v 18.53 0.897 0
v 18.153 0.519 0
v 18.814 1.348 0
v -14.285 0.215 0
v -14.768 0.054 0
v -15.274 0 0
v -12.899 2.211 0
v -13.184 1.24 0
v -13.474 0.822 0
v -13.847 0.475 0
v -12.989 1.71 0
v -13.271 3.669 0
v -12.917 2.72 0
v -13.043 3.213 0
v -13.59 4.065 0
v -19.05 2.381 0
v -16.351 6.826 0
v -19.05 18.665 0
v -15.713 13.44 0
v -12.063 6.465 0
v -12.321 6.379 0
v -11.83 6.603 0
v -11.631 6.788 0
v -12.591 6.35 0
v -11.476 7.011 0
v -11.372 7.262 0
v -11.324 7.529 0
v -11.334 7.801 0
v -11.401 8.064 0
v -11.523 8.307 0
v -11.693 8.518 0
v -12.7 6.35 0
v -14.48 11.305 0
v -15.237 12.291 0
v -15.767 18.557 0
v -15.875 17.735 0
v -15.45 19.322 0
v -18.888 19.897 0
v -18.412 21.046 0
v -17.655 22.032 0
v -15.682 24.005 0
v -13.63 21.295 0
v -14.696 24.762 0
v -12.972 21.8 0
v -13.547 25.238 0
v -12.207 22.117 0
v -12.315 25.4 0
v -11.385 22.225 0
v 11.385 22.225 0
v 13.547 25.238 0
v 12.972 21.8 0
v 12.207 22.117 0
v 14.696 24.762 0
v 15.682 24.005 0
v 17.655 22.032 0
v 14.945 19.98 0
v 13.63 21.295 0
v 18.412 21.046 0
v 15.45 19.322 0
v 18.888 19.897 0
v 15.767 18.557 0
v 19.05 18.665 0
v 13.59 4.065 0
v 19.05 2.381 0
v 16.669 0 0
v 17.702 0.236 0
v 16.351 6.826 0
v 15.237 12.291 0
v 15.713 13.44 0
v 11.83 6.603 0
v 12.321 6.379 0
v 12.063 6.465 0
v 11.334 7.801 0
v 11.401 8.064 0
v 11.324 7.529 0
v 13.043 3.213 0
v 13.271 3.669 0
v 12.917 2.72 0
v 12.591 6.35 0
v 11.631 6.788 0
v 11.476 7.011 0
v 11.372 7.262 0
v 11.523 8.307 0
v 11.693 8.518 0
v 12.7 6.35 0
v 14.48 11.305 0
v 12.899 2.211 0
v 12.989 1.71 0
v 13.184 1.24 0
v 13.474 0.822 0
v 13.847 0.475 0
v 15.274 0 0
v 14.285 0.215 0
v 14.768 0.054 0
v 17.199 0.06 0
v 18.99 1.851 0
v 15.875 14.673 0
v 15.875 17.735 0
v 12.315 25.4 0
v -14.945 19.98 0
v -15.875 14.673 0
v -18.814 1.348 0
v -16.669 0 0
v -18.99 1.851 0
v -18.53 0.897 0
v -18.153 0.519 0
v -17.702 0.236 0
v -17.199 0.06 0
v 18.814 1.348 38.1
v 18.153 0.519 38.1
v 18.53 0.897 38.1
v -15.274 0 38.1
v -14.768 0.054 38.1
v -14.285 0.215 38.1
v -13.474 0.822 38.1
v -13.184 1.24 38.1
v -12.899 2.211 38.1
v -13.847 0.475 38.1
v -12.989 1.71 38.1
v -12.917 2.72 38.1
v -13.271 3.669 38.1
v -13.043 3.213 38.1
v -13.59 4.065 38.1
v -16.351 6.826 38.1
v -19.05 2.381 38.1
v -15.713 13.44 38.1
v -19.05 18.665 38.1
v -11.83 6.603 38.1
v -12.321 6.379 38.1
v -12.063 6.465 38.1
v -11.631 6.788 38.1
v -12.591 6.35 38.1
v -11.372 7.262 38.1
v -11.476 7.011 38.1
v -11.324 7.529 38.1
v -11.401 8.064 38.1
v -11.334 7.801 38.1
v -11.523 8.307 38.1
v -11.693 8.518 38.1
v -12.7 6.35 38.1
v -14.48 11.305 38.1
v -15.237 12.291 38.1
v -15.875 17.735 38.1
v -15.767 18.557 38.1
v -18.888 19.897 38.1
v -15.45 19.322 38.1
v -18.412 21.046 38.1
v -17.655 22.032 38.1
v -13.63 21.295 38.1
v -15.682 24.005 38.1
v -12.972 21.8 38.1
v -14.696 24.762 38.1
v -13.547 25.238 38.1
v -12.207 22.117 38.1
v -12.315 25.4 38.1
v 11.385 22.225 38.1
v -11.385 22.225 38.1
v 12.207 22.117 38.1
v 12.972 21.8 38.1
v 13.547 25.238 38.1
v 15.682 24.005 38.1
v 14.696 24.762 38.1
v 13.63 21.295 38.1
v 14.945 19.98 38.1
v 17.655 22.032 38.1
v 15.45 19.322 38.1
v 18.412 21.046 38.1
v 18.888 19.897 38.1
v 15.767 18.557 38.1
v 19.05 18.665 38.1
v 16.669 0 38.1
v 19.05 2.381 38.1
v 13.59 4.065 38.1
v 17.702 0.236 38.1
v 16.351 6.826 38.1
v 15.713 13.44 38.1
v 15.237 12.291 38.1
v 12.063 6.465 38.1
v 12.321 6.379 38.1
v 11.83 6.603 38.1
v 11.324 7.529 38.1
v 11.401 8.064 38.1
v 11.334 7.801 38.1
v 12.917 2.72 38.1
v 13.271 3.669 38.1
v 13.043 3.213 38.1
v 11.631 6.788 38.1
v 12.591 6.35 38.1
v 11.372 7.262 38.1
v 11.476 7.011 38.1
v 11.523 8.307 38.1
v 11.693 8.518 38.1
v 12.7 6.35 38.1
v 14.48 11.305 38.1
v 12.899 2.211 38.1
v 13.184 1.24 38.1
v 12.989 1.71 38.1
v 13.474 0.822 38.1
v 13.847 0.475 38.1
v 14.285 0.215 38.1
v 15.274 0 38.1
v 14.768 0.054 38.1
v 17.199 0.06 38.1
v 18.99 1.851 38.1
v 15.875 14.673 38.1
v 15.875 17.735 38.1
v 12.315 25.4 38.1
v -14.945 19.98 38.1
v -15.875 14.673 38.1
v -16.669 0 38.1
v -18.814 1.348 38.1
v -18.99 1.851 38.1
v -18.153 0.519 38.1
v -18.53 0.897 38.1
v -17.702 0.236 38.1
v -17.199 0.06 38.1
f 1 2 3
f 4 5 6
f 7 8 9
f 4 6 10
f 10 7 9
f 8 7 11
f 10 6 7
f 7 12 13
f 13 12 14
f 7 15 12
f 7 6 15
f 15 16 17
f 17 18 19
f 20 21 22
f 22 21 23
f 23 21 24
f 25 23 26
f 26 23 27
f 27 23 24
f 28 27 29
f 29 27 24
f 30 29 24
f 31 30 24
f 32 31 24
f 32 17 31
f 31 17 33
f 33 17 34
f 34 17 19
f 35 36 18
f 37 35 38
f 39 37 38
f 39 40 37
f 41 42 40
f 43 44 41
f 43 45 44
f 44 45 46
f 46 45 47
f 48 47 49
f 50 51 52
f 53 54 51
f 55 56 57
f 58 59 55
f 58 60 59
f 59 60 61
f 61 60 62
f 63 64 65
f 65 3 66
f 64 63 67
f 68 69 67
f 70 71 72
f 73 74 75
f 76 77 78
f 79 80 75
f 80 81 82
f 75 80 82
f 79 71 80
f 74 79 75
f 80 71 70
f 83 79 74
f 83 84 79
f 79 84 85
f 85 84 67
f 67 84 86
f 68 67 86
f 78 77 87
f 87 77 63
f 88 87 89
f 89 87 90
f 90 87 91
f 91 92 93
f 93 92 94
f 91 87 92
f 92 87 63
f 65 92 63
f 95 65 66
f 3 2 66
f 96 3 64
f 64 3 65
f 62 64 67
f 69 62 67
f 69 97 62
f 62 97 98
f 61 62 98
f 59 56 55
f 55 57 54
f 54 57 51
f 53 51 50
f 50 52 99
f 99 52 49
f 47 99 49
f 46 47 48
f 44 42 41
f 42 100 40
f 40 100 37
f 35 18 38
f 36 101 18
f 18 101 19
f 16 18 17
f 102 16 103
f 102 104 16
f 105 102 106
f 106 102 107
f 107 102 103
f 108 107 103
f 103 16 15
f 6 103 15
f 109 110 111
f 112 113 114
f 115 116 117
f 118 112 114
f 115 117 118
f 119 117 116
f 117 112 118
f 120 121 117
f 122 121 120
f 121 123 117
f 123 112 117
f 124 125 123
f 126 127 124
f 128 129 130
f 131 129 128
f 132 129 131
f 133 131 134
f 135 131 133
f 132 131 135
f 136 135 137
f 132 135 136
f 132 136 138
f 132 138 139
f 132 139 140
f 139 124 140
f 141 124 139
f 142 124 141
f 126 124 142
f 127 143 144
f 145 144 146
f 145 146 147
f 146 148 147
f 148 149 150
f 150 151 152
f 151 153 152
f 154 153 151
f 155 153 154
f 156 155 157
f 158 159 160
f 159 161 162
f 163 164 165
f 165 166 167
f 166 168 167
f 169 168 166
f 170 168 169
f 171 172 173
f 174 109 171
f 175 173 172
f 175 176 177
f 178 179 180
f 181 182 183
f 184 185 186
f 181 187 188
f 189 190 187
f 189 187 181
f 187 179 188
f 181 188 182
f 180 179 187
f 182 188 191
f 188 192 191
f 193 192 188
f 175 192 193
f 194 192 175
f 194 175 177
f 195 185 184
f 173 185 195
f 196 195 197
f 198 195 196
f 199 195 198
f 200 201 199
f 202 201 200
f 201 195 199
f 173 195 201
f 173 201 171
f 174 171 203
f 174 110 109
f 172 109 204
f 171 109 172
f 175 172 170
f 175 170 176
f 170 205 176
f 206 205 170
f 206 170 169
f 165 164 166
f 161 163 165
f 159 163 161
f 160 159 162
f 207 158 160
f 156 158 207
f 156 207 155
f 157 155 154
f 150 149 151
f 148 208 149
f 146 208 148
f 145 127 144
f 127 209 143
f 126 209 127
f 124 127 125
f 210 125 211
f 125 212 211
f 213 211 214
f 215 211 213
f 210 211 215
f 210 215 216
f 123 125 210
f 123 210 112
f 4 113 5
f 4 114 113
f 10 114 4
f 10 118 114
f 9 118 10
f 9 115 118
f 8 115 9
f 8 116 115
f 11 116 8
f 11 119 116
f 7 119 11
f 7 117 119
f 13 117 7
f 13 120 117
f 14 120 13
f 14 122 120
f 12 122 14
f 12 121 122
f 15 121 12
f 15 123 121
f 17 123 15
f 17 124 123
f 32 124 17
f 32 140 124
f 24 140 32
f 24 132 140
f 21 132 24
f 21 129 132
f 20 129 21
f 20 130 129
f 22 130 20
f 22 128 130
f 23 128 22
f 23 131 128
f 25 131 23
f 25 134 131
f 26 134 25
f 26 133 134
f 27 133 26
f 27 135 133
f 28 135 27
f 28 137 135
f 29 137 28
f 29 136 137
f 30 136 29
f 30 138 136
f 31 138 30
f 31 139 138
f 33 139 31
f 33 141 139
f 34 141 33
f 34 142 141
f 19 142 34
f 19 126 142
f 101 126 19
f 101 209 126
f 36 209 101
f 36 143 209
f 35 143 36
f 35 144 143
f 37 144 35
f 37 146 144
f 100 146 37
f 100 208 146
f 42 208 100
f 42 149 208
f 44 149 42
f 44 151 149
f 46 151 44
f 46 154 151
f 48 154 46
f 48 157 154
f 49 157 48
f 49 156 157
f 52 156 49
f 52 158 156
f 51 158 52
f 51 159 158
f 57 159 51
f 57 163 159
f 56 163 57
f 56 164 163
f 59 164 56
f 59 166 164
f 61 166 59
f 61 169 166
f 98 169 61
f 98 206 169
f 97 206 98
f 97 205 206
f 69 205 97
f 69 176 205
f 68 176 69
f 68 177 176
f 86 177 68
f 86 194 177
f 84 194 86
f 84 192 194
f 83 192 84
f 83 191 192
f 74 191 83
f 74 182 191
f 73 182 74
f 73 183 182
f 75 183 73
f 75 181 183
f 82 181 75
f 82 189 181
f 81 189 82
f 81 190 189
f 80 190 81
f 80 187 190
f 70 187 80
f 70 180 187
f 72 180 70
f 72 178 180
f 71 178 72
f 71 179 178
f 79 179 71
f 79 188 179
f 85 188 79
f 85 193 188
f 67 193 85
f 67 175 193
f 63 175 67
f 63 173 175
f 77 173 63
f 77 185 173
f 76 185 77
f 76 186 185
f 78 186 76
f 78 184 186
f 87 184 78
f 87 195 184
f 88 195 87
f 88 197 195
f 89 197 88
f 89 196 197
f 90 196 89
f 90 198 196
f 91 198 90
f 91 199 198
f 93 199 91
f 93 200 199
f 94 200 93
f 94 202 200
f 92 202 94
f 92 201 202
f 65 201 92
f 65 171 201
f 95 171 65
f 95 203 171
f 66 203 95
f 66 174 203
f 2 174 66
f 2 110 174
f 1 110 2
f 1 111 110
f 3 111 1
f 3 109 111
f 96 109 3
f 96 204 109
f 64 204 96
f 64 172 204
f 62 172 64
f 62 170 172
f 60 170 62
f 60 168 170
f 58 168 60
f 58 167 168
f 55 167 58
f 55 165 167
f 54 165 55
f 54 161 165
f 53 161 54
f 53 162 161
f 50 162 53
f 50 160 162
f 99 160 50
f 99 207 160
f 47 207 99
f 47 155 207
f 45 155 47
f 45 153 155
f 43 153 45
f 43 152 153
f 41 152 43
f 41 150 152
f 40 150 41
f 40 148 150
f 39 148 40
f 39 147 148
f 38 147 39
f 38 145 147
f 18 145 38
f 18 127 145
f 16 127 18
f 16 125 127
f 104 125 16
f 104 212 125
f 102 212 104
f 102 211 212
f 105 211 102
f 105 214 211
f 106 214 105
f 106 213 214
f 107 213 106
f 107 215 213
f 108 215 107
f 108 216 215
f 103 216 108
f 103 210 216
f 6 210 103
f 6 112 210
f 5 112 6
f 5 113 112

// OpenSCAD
// file: ../lib/TOGComplexLib1.scad
function tcplx1_multiply(a, b) =
	[a[0]*b[0] - a[1]*b[1], a[0]*b[1] + a[1]*b[0]];
function tcplx1_divide(a, b) =
	let(bot = (b[0]*b[0] + b[1]*b[1]))
	[
		(a[0]*b[0] + a[1]*b[1])/bot,
		(a[1]*b[0] - a[0]*b[1])/bot
	];

assert([-11,23] == tcplx1_multiply([3,2], [1,7]));

assert([-1,3] == tcplx1_multiply([3,1], [0,1]));
assert([-1,3] == tcplx1_multiply([0,1], [3,1]));

echo(tcplx1_divide([-1,3], [3,1]));
assert([0,1] == tcplx1_divide([-1,3], [3,1]));

function tcplx1_normalize(vec) =
	let(veclen = sqrt(vec[0]*vec[0]+vec[1]*vec[1]))
	[vec[0] / veclen, vec[1] / veclen];

function tcplx1_relative_turnvec_vv(v0, v1) =
	tcplx1_divide(tcplx1_normalize(v1), tcplx1_normalize(v0));

function tcplx1_relative_turnvec_abc(p0, p1, p2) = tcplx1_relative_turnvec_vv(p1-p0, p2-p1);

// A 90-degree turn
assert([0,1] == tcplx1_relative_turnvec_abc([0,0], [1,0], [1,1]));
assert([0,1] == tcplx1_relative_turnvec_abc([0,0], [0,1], [-1,1]));

// A 45-degree turn
assert(tcplx1_normalize([1,1]) == tcplx1_relative_turnvec_abc([0,0], [1,0], [ 2,1]));
assert(tcplx1_normalize([1,1]) == tcplx1_relative_turnvec_abc([0,0], [0,1], [-1,2]));


function tcplx1_relative_angle_abc(p0, p1, p2) =
	let(turnvec = tcplx1_relative_turnvec_abc(p0, p1, p2))
	atan2(turnvec[1], turnvec[0]);

assert(-135 == tcplx1_relative_angle_abc([0,0], [1,0], [0,-1]));
assert( -90 == tcplx1_relative_angle_abc([0,0], [1,0], [1,-1]));
assert(   0 == tcplx1_relative_angle_abc([0,0], [1,0], [2, 0]));
assert(  90 == tcplx1_relative_angle_abc([0,0], [1,0], [1, 1]));
assert( 135 == tcplx1_relative_angle_abc([0,0], [1,0], [0, 1]));

assert(  90 == tcplx1_relative_angle_abc([1,1], [3,3], [1, 5]));
// file: ../lib/TOGArrayLib1.scad
// TOGArrayLib1.5
// 
// Functions for working with arrays.
// 
// v1.1:
// - tal1_reduce assert(is_list(items)) to prevent infinite recursion
//   when given undefined or other non-list values
// v1.1.1:
// - Fix tal1_uniq_remap_v2 to return "list-remap-result" as the
//   first element of the returned list
// v1.2:
// - Add tal1_replace_at function
// v1.3:
// - tal1_is_vec_of, tal1_is_vec_of_num
// v1.4:
// - tal1_assert_for_each, for when you want to assert something
//   about each of a list of items and get nice failure messages
// v1.5:
// - Add tal1_duplicate_reversed function, which may be
//   handy when generating symmetrical polygons and stuff.

/**
 * Make a list with the contents of list `a`,
 * but starting at offset `off`, replaced by the contents of list `b`.
 * len(result) = max(len(a), off+len(b))
 */
function tal1_replace_at(a, off, b, default_value=undef, default_value_function=undef) =
	assert(is_list(a))
	assert(is_list(b))
	let( _dvf = !is_undef(default_value_function) ? default_value_function : function(i) default_value )
[
	for( i=[0:1:min(off,len(a))-1] ) a[i],
	for( i=[len(a):1:off-1] ) _dvf(i),
	for( i=[off:1:off+len(b)-1] ) b[i-off],
	for( i=[off+len(b):1:len(a)-1] ) a[i],
];

// Simplest case
assert([] == tal1_replace_at([], 0, []));
// Second simplest cases
assert(["foo"] == tal1_replace_at(["foo"], 0, []));
assert(["foo"] == tal1_replace_at([], 0, ["foo"]));
// Replace one item
assert(["foo","quux","baz"] == tal1_replace_at(["foo","bar","baz"], 1, ["quux"]));
// Replace and extend
assert(["foo","quux","tuna","tina"] == tal1_replace_at(["foo","bar","baz"], 1, ["quux", "tuna", "tina"]));
// Add beyond end of `a`
assert(["foo","zzz","quux"] == tal1_replace_at(["foo"], 2, ["quux"], default_value="zzz"));
// Adding 'nothing' should still fill to that point with defaults
assert(["foo","zzz","zzz"] == tal1_replace_at(["foo"], 3, [], default_value="zzz"));


function tal1_reduce(start, items, func, offset=0) =
	assert(is_list(items))
	len(items) == offset ? start :
	tal1_reduce(func(start, items[offset]), items, func, offset+1);

function tal1_consecutive_duplicate_count(items) = tal1_reduce(
	[0, undef],
	items,
	function(z,item) [z[0] + (item == z[1] ? 1 : 0), item]
)[0];

assert(0 == tal1_consecutive_duplicate_count([]));
assert(0 == tal1_consecutive_duplicate_count([50]));
assert(1 == tal1_consecutive_duplicate_count([50,50]));
assert(0 == tal1_consecutive_duplicate_count([50,51,52,53]));
assert(1 == tal1_consecutive_duplicate_count([50,51,52,52]));
assert(3 == tal1_consecutive_duplicate_count([50,50,50,50]));

// Set test_size to arbirarily large values
// to ensure that OpenSCAD can handle heavy recursion
let(test_size=1000) assert(test_size/2 == tal1_consecutive_duplicate_count([for(i=[0:1:test_size-1]) floor(i/2)]));



function tal1_uniq_(items, off0, off1) =
	let(chunklen = off1-off0)
	chunklen == 0 ? [] :
	chunklen == 1 ? [items[off0]] :
	let(half=floor(chunklen/2))
	let(left  = tal1_uniq_(items, off0     , off0+half))
	let(right = tal1_uniq_(items, off0+half, off1     ))
	assert(len(left) > 0)
	assert(len(right) > 0)
	left[len(left)-1] == right[0] ? [each left, for(i=[1:1:len(right)-1]) right[i]] :
	[each left, each right];

/** Given a list of items, returns a new list with identical consecutive items merged */
function tal1_uniq(items) = tal1_uniq_(items, 0, len(items));

assert([] == tal1_uniq([]));
assert([123] == tal1_uniq([123]));
assert([55,0,1,2,3] == tal1_uniq([55,0,1,2,3]));
assert([55,0,1,2] == tal1_uniq([55,0,1,1,2]));
assert([55,0,1] == tal1_uniq([55,55,0,0,0,0,0,0,1,1,1,1]));
assert([55,0] == tal1_uniq([55,0,0,0,0,0,0,0]));



/**
 * Returns [new items, old index -> new index mapping].
 * No-op version.
 */
function tal1_uniq_remap_v1(items) =
	["list-remap-result", items, [for (vi=[0:1:len(items)-1]) vi]];

// [a, a, b, b, c, c]
//
// [a,    ...], []  -> [a],[0]
// [a, a, ...], [0] -> [a],[0,0]

assert([1,2,3] == [1,2,3]);

/**
 * Recursive version that will combine adjacent identical vertexes,
 * but will use the original items.
 */
function tal1_uniq_remap_v2(items, map=[]) =
	let(index = len(map))
	len(items) == index ? ["list-remap-result", items, map] :
	index == 0 ? tal1_uniq_remap_v2(items, [0]) :
	items[index] == items[map[index-1]] ? tal1_uniq_remap_v2(items, [for(vi=map) vi, map[index-1]]) :
	tal1_uniq_remap_v2(items, [for(vi=map) vi, index]);

assert(tal1_uniq_remap_v2([1,1,2,2,3,4]) == ["list-remap-result", [1,1,2,2,3,4], [0,0,2,2,4,5]]);


/**
 * Returns true if `vec` is a list of at least min_len items
 * and component_check(each item, even those beyond min_len) is true.
 */
function tal1_is_vec_of(vec, min_len=0, component_check=function(x) true) =
	assert(is_num(min_len) && min_len >= 0)
	assert(is_function(component_check))
	is_list(vec) && len(vec) >= min_len &&
	tal1_reduce(true, vec, function(prev,item) prev && component_check(item));

function tal1_is_vec_of_num(vec, min_len=0) = tal1_is_vec_of(vec, min_len, function(i) is_num(i));

assert( true == tal1_is_vec_of_num([1,2,3]));
assert( true == tal1_is_vec_of_num([]));
assert( true == tal1_is_vec_of_num([1,2,3], 3));
assert(false == tal1_is_vec_of_num([1,2], 3));
assert(false == tal1_is_vec_of_num([1,2,"spoon"], 3));
// Requirements are ambiguous when
// first min_len items are numbers, but there are non-numeric items afterwards,
// so let's error on the side of saying 'no, it's not a list of numbers';
// i.e. the item check and the min_len are independent.
assert(false == tal1_is_vec_of_num([1,2,3,"artichoke"], 3));


/**
 * Asserts that item_checker(each item in list, index of item)[0] is true.
 * Second element of item_checker return value is assertion message.
 * Returns the original list, in case that's useful to you.
 */
function tal1_assert_for_each(list, item_checker) =
	let( _ignored = [ for(i=[0:1:len(list)-1])
		let(q=item_checker(list[i],i))
		let(passed=is_bool(q) ? q : is_list(q) ? q[0] : assert(false, str(
			"tal1_assert_for_each: item_checker should return Bool|[Bool,String], but returned ",
			q, " for item at index ", i)))
		let(message=is_list(q) ? q[1] : undef)
		assert(passed, message)
		q
	])
	list;

// Callback can return a boolean...
assert([1,2,3] == tal1_assert_for_each([1,2,3], function(v,i) is_num(v)));
// ...or a [boolean, string]
assert([1,2,3] == tal1_assert_for_each([1,2,3], function(v,i) [is_num(v), "element be a num"]));

// [a, b, c] -> [a, b, c, rxf(c), rxf(b), rxf(a)]
function tal1_duplicate_reversed(list, rxf=function(item) item) =
	[
		each list,
		for( i=[len(list)-1 : -1 : 0] ) rxf(list[i]),
	];
// file: ../lib/TOGMod1Constructors.scad
// TOGMod1Constructors-v1.11
// 
// Functions to construct objects understood by TOGMod1
// 
// v1.1:
// - Add togmod1_make_rounded_rect
// v1.2:
// - togmod1_make_rounded_rect can make ovals
// v1.3:
// - togmod1_circle_points, to just get the points of a circle
// - if pos parameter to circle function has a third element,
//   returned vertexes will include it as the z component;
// v1.3.1
// - Some assertions
// v1.4:
// - Refactor togmod1_rounded_rect_points and togmod1_circle_points
//   to use togmod1__make_nd_vector_adder for adapting to whatever
//   `pos` parameter is.
// v1.5:
// - togmod_rounded_rect_points will not simplify completely rounded sides
//   (where length of side is exactly twice the rounding radius)
//   unless simplify_rounded_sides=true
//   - This makes it more useful for polyhedron generation,
//     where radius varies, but number of points must remain constant.
// v1.6:
// - togmod1_make_rect makes a simple rectangle
// - togmod1_make_rounded_rect will defer to togmod1_make_rect when r=0
// v1.7:
// - togmod1_make_circle will return empty shape (["union"]) when d=0
// v1.8:
// - Add togmod1_text
// v1.9:
// - togmod1_circle_points uses 3 as minimum circle point count instead of 6
// v1.10:
// - Fix togmod1_linear_extrude_y so that range corresponds to Y start/end and
//   polygon X,Y correspond to X,Z.  Previously it was rotated wrongly,
//   which would have gone unnoticed for symmetrical shapes centered at 0,0.
// v1.11:
// - Remove an 'echo'

use <./TOGArrayLib1.scad>

function togmod1__make_nd_vector_adder(origin=[0,0]) =
	let(origin_is_zero = tal1_reduce(true, origin, function(prev,item) prev && item == 0))
	origin_is_zero ? (function(vec) len(vec) >= len(origin) ? vec : tal1_replace_at(origin, 0, vec)) :
	function(vec) [
		for(i=[0:1:max(len(origin),len(vec))-1]) (len(vec) > i ? vec[i] : 0) + (len(origin) > i ? origin[i] : 0),
	];

assert([1,2,3] == togmod1__make_nd_vector_adder()([1,2,3]));
assert([1,2,3] == togmod1__make_nd_vector_adder([0,0,3])([1,2]));


function togmod1_make_cuboid(size) =
	assert(is_list(size))
	assert(len(size) >= 3)
	assert(is_num(size[0]))
	assert(is_num(size[1]))
	assert(is_num(size[2]))
	["polyhedron-vf", [
		[-size[0]/2, -size[1]/2, -size[2]/2],
		[+size[0]/2, -size[1]/2, -size[2]/2],
		[-size[0]/2, +size[1]/2, -size[2]/2],
		[+size[0]/2, +size[1]/2, -size[2]/2],
		[-size[0]/2, -size[1]/2, +size[2]/2],
		[+size[0]/2, -size[1]/2, +size[2]/2],
		[-size[0]/2, +size[1]/2, +size[2]/2],
		[+size[0]/2, +size[1]/2, +size[2]/2]
	], [
		[0,1,3,2],[0,4,5,1],[4,6,7,5],[3,7,6,2],[1,5,7,3],[6,4,0,2]
	]];

function togmod1_make_polygon(verts) =
	["polygon-vp", verts, [[for( i=[0:1:len(verts)-1] ) i%len(verts)]]];

function togmod1_rounded_rect_points(size, r, pos=[0,0], simplify_rounded_sides=false) =
	assert(is_list(size))
	assert(len(size) >= 2)
	let(radii = is_list(r) ? r : is_num(r) ? [r,r] : assert(false, "rounded_rect r(adius) should be list<num> or num"))
	let(rx = radii[0])
	let(ry = radii[1])
	assert(is_num(rx))
	assert(is_num(ry))
	assert(size[0] >= 2*rx, str("size[0] must be >= 2*r[0]; size[0] = ",size[0],", 2*r[0] = ",2*rx))
	assert(size[1] >= 2*ry, str("size[1] must be >= 2*r[1]; size[1] = ",size[1],", 2*r[1] = ",2*ry))
	let(quarterfn=max($fn/4, 1))
	let(qfnx = simplify_rounded_sides && size[0] == 2*rx ? quarterfn-1 : quarterfn)
	let(qfny = simplify_rounded_sides && size[1] == 2*ry ? quarterfn-1 : quarterfn)
	let(finalizepos = togmod1__make_nd_vector_adder(pos))
[
	for(a=[0 : 1 : qfnx]) let(ang=      a*90/quarterfn) finalizepos([ size[0]/2-rx + rx*cos(ang),  size[1]/2-ry + ry*sin(ang)]),
	for(a=[0 : 1 : qfny]) let(ang= 90 + a*90/quarterfn) finalizepos([-size[0]/2+rx + rx*cos(ang),  size[1]/2-ry + ry*sin(ang)]),
	for(a=[0 : 1 : qfnx]) let(ang=180 + a*90/quarterfn) finalizepos([-size[0]/2+rx + rx*cos(ang), -size[1]/2+ry + ry*sin(ang)]),
	for(a=[0 : 1 : qfny]) let(ang=270 + a*90/quarterfn) finalizepos([ size[0]/2-rx + rx*cos(ang), -size[1]/2+ry + ry*sin(ang)]),
];

function togmod1_make_rect(size) =
	togmod1_make_polygon([
		[-size[0]/2, -size[1]/2],
		[+size[0]/2, -size[1]/2],
		[+size[0]/2, +size[1]/2],
		[-size[0]/2, +size[1]/2],
	]);

function togmod1_make_rounded_rect(size, r) =
	r == 0 ? togmod1_make_rect(size) :
	togmod1_make_polygon(togmod1_rounded_rect_points(size,r,simplify_rounded_sides=true));

/**
 * Returns points for an approximation of a circle where points are at distance r from pos.
 * Can be used to make other regular polygons, but the faces will be less than that
 * distance from pos (do some trig if you want face distance, e.g. for a hex nut).
 */
function togmod1_circle_points(r, pos=[0,0], d=undef) =
	assert( !is_undef(r) || !is_undef(d) )
	assert(!is_undef(pos[0]))
	assert(!is_undef(pos[1]))
	let(finalizepos = togmod1__make_nd_vector_adder(pos))
	let(r_ = !is_undef(r) ? r : d/2)
	let(fn = max($fn, 3))
	[for(i=[0 : 1 : fn-1]) finalizepos([r_*cos(i*360/fn), r_*sin(i*360/fn)])];

function togmod1_make_circle(r, pos=[0,0], d=undef) =
	r == 0 || d == 0 ? ["union"] :
	togmod1_make_polygon(togmod1_circle_points(r=r, pos=pos, d=d));

function togmod1_make_cylinder(d, zrange=[0,1], r=undef, pos=[0,0]) =
	assert( !is_undef(r) || !is_undef(d) )
	let( r_ = !is_undef(r) ? r : d/2 )
	// TODO: Make polyhedron directly
	["linear-extrude-zs", zrange, togmod1_make_circle(r=r_, pos=pos)];

function togmod1__is_range1d(range) = is_list(range) && len(range) == 2 && is_num(range[0]) && is_num(range[1]);

function togmod1_linear_extrude_z(range, shape) =
	assert(togmod1__is_range1d(range))
	["linear-extrude-zs", range, shape];
function togmod1_linear_extrude_x(range, shape) =
	assert(togmod1__is_range1d(range))
	["rotate", [90, 0, 90], togmod1_linear_extrude_z(range, shape)];
function togmod1_linear_extrude_y(range, shape) =
	assert(togmod1__is_range1d(range))
	["rotate", [90, 0,  0], togmod1_linear_extrude_z([-range[1], -range[0]], shape)];

function togmod1_text(text, size, font, halign, valign, spacing, direction, language, script) =
	["text-tsfhvsdls", text, size, font, halign, valign, spacing, direction, language, script];
// file: ../lib/TOGMod1.scad
// TOGMod1.9
// OpenSCAD library for representing shapes
// 
// See also: Functional OpenSCAD (https://github.com/thehans/FunctionalOpenSCAD)
// 
// v1.8:
// - Add `text-tsfhvsdls`
// v1.9
// - Add `offset-ds` (offset with _d_elta a _s_hape)

module togmod1_domodule(mod) {
	assert(is_list(mod));
	assert(len(mod) > 0);
	if( mod[0] == "polygon-vp" ) {
		// ["polygon-vp", vertexes, paths]
		polygon(points=mod[1], paths=mod[2]);
	} else if( mod[0] == "polyhedron-vf" ) {
		polyhedron(mod[1], faces=mod[2]);
	} else if( mod[0] == "scale" ) {
		assert(len(mod) == 3);
		scale(mod[1]) togmod1_domodule(mod[2]);
	} else if( mod[0] == "translate" ) {
		assert(len(mod) == 3);
		assert(is_list(mod[1]));
		for(c=mod[1]) assert(is_num(c), "translate component should be numeric");
		translate(mod[1]) togmod1_domodule(mod[2]);
	} else if( mod[0] == "rotate" ) {
		assert(len(mod) == 3);
		rotate(mod[1]) togmod1_domodule(mod[2]);
	} else if( mod[0] == "intersection" ) {
		intersection_for( i=[1:1:len(mod)-1] ) togmod1_domodule(mod[i]);
	} else if( mod[0] == "difference" ) {
		difference() {
			togmod1_domodule(mod[1]);
			for( i=[2:1:len(mod)-1] ) togmod1_domodule(mod[i]);
		}
	} else if( mod[0] == "union" ) {
		for( i=[1:1:len(mod)-1] ) togmod1_domodule(mod[i]);
	} else if( mod[0] == "hull" ) {
		hull() for( i=[1:1:len(mod)-1] ) togmod1_domodule(mod[i]);
	} else if( mod[0] == "offset-rs" ) {
		assert(len(mod) == 3);
		assert(is_num(mod[1]));
		assert(is_list(mod[2]));
		offset(mod[1]) togmod1_domodule(mod[2]);
	} else if( mod[0] == "linear-extrude-zs" ) {
		// ["linear-extrude-zs", [z0,z1], 2d_shape] // centered
		// ["linear-extrude-zs", height, 2d_shape]
		let( zrange = is_list(mod[1]) ? mod[1] : [-mod[1]/2, mod[1]/2] ) {
			translate([0,0,zrange[0]]) linear_extrude(zrange[1]-zrange[0]) togmod1_domodule(mod[2]);
		}
	} else if( mod[0] == "render" ) {
		render() togmod1_domodule(mod[1]);
	} else if( mod[0] == "minkowski" ) {
		minkowski() {
			togmod1_domodule(mod[1]);
			togmod1_domodule(mod[2]);
		}
	} else if( mod[0] == "x-debug" ) {
		# togmod1_domodule(mod[1]);
	} else if( mod[0] == "x-color" ) {
		color(mod[1]) togmod1_domodule(mod[2]);
	} else if( mod[0] == "text-tsfhvsdls" ) {
		text(text=mod[1], size=mod[2], font=mod[3], halign=mod[4], valign=mod[5], spacing=mod[6], direction=mod[7], language=mod[7], script=mod[8]);
	} else if( mod[0] == "offset-ds" ) {
		assert(is_num(mod[1]));
		assert(is_list(mod[2]));
		offset(delta=mod[1]) togmod1_domodule(mod[2]);
	} else {
		assert(false, str("Unrecognized shape: ", mod[0]));
	}
}
// main file
// Clurp2507-v0.1
//
// A conduit piece that clips to MiniRail

rail_width_u = 12;
length_u = 24;
height_u = 16;
inner_corner_extension_u = 0.3;
$fn = 32;

module __clarp2507__end_params() { }

function mirror_point(point) = [-point[0], point[1]];

function translate_rathnode(node, translation) = [
	node[0],
	node[1] + translation,
	for(i=[2:1:len(node)-1]) node[i]
];

function mirror_rathnode(node) = [
	node[0],
	mirror_point(node[1]),
	for(i=[2:1:len(node)-1]) node[i]
];

function reverse_list(list) = [
	for(i=[len(list)-1:-1:0]) list[i]
];

use <../lib/TOGMod1.scad>
use <../lib/TOGMod1Constructors.scad>
use <../lib/TOGPath1.scad>

function translate_and_mirror_rathnodes(nodes, translation) = [
	each              [for(n=nodes)                 translate_rathnode(n, translation) ] ,
	each reverse_list([for(n=nodes) mirror_rathnode(translate_rathnode(n, translation))]),
];

function generate_clurp2507_rath(rail_width, clip_height, inner_corner_extension=0.3) =
	let(x0 = rail_width/2)
	let(y1 = clip_height)
	let(ce = inner_corner_extension)
	let(rath_data = [
		["togpath1-rathnode", [ 2, y1-2], ["round", 2]],
		["togpath1-rathnode", [ 4, y1-4], ["round", 2]],
		["togpath1-rathnode", [ 4,    8], ["round", 3]],
		["togpath1-rathnode", [ 0,    4], ["round", 0.8]],
		if(ce > 0) ["togpath1-rathnode", [ 2,    4], ["round", 0.8]],
		["togpath1-rathnode", [ 4+ce, 4+ce], /*if(ce > 0) ["round", ce/2]*/],
		["togpath1-rathnode", [ 0,    0], ["round", 1.5]],
		["togpath1-rathnode", [ 6,    0], ["round", 1.5]],
		["togpath1-rathnode", [ 6, y1-3], ["round", 3]],
		["togpath1-rathnode", [ 3, y1-0], ["round", 3]],
	])
	["togpath1-rath", each translate_and_mirror_rathnodes(rath_data, [x0,0])];

togmod1_domodule(togmod1_linear_extrude_z([0,length_u*254/160], ["scale", 254/160, togpath1_rath_to_polygon(generate_clurp2507_rath(rail_width_u, height_u, inner_corner_extension=inner_corner_extension_u))]));
